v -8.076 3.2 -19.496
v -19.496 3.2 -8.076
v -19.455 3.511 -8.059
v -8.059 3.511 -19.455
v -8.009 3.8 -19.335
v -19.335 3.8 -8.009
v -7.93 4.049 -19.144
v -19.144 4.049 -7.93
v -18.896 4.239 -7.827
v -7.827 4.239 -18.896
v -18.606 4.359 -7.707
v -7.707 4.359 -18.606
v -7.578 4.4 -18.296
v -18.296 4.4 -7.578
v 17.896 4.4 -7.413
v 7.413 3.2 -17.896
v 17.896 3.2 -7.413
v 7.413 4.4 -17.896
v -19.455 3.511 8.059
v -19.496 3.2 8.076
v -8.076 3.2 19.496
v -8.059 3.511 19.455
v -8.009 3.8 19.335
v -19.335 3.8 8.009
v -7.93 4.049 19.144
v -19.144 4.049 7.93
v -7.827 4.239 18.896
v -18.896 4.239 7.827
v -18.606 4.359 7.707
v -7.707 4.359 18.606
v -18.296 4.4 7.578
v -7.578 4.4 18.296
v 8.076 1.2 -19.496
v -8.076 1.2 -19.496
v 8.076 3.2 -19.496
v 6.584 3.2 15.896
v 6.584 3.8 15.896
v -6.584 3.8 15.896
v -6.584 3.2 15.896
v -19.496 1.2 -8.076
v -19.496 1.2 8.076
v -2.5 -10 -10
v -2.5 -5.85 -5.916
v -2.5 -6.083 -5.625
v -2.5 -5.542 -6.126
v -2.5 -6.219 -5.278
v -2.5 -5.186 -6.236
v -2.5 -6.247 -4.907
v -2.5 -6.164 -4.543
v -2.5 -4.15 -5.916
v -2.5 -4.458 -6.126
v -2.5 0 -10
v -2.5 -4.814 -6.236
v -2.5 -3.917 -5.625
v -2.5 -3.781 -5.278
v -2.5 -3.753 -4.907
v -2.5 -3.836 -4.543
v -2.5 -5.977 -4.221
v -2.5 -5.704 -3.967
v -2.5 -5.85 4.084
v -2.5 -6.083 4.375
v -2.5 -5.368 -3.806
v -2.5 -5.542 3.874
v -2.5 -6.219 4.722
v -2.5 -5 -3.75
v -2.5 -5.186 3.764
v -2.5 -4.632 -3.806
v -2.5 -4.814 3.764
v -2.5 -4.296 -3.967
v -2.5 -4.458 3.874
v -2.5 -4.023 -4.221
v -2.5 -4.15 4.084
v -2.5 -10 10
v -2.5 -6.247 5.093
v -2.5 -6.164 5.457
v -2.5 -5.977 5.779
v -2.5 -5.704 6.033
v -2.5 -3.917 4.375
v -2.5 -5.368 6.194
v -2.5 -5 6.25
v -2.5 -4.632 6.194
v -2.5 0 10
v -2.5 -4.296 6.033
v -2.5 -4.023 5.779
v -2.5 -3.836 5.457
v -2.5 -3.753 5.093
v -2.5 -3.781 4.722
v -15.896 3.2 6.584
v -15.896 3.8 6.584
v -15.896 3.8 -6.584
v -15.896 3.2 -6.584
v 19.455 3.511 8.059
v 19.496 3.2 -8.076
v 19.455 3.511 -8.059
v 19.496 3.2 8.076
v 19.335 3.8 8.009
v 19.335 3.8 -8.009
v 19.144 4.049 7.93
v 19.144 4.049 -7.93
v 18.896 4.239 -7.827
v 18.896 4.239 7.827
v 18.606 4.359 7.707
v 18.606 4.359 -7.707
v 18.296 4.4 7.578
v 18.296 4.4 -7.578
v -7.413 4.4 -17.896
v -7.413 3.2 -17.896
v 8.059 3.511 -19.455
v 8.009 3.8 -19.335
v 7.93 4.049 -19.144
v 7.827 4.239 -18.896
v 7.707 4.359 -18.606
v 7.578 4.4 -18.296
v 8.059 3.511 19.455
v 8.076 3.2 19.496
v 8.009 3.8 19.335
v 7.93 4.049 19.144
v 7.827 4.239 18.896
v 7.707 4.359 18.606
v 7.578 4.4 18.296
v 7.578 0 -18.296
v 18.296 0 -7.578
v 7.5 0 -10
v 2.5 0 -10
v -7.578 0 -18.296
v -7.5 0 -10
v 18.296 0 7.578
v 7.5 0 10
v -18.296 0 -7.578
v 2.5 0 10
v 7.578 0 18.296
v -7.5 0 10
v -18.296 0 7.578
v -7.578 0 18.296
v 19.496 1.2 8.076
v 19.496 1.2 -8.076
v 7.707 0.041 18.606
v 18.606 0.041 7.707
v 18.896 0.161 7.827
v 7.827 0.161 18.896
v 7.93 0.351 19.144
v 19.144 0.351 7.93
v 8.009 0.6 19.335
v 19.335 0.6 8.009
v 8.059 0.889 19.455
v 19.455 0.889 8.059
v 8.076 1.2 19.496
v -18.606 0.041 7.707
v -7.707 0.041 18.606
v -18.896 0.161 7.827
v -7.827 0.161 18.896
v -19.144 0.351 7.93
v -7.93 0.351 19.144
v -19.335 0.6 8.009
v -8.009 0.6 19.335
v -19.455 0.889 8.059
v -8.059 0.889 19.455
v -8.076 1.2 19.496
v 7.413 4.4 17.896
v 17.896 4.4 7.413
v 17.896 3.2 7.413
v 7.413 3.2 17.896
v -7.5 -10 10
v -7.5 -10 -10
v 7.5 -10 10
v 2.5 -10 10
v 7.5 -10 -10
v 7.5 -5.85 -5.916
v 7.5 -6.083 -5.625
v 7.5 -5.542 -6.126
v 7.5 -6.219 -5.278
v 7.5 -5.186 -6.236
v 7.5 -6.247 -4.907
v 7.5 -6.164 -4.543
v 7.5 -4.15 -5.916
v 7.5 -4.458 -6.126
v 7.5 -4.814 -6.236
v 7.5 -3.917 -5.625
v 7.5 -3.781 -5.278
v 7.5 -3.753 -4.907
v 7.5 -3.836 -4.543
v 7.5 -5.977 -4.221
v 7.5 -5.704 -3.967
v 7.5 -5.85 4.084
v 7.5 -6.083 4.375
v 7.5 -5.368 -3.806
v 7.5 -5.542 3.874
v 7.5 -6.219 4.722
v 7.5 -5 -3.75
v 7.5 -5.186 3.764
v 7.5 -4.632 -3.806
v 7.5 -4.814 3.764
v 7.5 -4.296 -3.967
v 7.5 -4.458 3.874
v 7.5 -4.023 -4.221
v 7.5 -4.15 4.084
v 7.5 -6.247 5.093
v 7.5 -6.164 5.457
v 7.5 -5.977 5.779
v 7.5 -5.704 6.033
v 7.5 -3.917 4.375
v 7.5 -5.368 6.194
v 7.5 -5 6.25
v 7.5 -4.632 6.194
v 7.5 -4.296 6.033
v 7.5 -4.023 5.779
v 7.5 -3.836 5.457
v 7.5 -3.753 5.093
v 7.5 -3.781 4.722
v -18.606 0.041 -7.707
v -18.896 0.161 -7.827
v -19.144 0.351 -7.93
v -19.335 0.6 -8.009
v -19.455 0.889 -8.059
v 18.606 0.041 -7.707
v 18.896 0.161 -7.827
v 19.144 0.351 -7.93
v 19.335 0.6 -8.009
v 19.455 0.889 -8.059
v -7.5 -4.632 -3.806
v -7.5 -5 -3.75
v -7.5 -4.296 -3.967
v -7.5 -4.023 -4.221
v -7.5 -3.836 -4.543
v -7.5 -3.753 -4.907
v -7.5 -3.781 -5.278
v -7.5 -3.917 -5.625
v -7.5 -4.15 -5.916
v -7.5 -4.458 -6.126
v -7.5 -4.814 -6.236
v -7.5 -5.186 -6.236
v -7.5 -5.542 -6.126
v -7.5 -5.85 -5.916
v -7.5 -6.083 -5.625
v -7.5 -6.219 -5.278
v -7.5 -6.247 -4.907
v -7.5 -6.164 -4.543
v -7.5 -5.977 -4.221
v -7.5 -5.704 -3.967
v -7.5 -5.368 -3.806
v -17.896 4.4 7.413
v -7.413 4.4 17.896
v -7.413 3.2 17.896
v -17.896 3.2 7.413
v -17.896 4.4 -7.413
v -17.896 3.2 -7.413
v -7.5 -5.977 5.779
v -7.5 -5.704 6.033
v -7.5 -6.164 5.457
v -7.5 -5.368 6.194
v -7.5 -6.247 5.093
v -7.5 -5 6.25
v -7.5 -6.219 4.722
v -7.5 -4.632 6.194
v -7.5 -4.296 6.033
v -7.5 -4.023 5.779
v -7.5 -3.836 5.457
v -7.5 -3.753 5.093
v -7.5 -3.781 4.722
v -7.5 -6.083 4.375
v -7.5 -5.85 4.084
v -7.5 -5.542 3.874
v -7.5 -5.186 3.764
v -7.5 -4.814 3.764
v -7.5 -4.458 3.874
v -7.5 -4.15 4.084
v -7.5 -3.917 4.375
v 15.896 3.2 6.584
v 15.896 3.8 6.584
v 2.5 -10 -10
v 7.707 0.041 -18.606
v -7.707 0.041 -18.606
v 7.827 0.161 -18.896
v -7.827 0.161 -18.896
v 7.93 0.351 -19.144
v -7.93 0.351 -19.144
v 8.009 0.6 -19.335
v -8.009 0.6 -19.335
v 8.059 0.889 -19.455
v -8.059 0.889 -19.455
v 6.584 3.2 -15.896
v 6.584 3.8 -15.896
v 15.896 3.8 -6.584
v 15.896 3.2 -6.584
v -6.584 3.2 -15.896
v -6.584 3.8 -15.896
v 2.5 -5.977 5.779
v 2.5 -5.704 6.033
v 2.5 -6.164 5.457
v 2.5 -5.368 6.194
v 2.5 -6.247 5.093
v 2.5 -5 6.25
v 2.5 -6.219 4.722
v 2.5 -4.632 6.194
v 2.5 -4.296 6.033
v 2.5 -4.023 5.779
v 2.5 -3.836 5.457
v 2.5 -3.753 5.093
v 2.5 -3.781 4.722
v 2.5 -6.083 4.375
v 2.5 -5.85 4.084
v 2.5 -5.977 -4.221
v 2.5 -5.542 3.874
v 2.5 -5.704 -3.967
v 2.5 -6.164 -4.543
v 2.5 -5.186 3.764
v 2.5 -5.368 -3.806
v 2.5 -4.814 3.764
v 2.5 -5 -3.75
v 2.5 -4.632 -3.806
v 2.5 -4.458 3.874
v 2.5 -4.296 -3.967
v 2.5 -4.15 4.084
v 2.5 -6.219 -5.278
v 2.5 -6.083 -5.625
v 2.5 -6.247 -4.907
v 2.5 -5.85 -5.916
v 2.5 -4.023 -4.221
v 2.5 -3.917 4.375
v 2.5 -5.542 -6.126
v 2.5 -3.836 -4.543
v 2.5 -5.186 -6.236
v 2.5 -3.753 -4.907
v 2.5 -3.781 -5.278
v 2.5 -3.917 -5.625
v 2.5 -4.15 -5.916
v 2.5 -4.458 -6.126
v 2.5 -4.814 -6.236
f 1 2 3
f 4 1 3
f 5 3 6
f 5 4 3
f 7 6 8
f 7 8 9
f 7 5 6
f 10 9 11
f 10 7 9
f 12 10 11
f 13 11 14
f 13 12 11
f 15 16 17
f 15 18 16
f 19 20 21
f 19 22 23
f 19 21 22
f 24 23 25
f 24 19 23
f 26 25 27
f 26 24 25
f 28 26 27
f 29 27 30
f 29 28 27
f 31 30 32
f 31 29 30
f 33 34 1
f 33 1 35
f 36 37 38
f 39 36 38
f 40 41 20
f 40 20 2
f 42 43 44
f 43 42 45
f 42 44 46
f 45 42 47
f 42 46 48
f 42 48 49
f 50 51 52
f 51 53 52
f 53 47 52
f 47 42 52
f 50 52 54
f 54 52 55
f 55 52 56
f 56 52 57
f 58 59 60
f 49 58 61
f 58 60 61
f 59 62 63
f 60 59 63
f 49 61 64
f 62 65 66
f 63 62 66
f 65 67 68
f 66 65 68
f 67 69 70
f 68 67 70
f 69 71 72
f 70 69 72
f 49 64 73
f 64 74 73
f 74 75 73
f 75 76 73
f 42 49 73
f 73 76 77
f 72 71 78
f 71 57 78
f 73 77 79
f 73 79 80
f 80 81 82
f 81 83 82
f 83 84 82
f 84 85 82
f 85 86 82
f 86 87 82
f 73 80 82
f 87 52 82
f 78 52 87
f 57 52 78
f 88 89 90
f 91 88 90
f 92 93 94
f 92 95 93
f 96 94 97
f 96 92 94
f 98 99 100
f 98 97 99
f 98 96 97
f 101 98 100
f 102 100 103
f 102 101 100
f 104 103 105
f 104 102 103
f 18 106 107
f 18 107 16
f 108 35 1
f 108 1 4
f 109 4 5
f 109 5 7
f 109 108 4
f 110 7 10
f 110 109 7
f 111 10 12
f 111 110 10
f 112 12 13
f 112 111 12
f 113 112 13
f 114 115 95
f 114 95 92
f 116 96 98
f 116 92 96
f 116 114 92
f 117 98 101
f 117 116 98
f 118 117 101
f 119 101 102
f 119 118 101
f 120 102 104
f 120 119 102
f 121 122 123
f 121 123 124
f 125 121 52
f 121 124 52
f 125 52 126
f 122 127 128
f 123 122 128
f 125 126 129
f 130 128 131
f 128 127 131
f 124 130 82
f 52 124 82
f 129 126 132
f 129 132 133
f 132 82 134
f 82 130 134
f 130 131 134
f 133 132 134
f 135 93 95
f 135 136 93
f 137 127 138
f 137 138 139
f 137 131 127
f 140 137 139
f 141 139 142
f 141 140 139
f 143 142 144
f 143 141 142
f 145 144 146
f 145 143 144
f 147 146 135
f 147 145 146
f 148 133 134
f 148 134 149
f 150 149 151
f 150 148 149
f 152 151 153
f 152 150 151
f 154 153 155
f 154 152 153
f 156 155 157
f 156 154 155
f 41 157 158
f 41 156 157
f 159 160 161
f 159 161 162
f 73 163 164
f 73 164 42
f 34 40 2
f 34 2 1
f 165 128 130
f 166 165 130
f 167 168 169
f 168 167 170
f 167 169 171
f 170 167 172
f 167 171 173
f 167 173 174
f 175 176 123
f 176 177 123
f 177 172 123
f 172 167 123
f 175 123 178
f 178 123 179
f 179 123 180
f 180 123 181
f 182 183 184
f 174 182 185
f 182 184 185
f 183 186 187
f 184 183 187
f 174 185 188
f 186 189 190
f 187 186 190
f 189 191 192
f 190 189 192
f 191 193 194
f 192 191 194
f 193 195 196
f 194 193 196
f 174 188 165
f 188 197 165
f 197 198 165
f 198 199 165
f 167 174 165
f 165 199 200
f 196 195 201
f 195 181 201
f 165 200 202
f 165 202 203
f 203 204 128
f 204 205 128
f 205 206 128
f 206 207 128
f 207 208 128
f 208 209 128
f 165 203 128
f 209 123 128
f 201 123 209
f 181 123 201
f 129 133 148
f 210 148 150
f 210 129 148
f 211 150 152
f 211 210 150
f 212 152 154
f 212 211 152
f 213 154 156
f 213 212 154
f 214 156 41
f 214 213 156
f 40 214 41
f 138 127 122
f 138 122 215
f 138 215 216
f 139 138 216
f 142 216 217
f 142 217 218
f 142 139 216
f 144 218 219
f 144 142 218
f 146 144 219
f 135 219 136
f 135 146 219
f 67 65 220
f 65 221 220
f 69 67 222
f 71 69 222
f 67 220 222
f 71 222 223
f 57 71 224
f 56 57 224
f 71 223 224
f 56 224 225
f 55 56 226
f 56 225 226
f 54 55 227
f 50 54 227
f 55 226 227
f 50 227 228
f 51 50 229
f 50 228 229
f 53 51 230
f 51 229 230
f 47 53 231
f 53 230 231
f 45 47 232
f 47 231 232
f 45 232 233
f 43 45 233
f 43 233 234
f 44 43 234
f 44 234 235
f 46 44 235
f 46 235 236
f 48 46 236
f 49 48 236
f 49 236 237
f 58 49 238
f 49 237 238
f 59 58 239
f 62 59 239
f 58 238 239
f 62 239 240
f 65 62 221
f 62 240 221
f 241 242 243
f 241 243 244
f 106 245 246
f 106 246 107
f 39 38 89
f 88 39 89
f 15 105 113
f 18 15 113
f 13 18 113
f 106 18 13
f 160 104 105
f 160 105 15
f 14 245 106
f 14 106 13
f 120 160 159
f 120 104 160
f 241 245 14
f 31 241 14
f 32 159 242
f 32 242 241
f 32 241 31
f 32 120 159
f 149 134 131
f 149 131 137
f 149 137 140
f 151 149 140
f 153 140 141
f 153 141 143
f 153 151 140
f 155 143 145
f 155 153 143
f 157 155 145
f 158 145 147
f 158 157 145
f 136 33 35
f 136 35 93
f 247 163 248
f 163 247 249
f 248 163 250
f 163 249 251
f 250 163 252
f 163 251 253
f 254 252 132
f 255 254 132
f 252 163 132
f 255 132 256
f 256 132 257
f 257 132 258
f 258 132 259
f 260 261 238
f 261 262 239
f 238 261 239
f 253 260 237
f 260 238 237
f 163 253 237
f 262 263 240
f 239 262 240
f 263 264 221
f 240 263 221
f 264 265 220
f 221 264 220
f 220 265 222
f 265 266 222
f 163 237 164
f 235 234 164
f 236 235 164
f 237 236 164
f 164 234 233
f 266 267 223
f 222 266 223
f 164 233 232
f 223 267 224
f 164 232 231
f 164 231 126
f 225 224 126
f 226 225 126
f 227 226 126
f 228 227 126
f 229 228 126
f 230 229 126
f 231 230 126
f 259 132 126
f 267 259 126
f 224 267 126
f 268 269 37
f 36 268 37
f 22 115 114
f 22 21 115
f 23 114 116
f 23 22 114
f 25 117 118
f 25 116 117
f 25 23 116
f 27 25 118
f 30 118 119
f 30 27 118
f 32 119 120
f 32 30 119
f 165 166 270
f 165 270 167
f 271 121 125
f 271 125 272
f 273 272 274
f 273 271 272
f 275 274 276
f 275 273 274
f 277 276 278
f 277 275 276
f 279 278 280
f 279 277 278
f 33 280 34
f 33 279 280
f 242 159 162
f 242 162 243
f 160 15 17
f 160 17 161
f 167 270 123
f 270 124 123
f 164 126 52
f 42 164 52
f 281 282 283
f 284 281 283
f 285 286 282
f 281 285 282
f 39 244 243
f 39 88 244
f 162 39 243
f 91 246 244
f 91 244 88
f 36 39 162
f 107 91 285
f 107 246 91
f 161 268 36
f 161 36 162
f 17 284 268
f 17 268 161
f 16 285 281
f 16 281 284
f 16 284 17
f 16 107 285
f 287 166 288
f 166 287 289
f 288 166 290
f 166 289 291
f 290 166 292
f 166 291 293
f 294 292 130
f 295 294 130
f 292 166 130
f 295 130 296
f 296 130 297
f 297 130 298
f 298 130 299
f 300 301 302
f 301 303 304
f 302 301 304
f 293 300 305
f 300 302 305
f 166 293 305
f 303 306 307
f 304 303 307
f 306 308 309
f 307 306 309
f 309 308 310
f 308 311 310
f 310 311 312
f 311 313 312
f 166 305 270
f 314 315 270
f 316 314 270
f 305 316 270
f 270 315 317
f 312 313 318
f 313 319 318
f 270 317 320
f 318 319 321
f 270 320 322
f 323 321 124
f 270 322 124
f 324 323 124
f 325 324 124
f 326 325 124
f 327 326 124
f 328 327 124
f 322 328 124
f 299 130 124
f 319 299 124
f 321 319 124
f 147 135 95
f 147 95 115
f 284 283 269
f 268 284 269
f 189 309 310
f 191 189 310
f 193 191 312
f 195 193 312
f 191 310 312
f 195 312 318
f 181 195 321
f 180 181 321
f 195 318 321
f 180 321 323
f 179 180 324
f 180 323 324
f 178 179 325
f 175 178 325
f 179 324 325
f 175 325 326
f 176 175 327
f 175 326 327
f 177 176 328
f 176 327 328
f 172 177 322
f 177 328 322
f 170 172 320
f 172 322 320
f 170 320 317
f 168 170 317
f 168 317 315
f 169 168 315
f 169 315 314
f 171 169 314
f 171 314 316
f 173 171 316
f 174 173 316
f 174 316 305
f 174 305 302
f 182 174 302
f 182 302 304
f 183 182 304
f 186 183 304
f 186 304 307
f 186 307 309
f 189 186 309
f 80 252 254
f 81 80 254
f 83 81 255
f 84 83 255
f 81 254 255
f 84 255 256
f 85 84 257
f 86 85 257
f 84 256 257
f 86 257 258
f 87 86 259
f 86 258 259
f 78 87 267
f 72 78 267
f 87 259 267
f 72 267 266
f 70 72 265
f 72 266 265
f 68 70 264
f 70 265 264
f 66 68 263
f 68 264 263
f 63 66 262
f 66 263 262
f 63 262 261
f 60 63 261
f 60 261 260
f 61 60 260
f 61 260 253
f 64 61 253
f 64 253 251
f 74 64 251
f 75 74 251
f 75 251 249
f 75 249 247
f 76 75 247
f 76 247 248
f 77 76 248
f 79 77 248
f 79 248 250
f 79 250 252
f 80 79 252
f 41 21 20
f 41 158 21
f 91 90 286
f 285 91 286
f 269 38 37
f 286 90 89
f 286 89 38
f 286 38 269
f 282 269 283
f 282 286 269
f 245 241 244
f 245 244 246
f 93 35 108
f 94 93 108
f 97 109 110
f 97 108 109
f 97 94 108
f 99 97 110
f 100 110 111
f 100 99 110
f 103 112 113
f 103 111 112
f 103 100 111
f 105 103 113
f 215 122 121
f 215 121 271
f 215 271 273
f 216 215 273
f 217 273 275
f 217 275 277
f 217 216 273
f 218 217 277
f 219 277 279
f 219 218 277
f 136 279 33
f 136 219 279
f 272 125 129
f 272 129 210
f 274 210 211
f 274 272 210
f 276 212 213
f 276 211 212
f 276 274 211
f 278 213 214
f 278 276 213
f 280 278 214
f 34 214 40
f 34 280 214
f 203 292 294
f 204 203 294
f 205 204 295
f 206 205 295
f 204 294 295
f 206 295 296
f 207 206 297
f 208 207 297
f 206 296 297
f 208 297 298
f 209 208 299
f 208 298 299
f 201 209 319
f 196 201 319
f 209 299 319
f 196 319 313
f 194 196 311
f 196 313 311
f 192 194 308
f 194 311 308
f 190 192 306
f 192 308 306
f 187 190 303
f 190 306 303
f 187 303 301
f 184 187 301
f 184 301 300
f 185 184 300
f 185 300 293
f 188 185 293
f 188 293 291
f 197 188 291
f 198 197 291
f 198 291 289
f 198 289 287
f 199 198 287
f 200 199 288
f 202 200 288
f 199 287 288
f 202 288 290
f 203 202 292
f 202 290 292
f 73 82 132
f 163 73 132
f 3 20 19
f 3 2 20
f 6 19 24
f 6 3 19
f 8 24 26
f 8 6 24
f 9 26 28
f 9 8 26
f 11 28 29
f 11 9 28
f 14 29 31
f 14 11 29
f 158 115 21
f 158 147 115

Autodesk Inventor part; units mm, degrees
ref_plane "YZ Plane" through (0, 0, 0) normal (1, 0, 0) x (0, 1, 0)
ref_plane "XZ Plane" through (0, 0, 0) normal (0, 1, 0) x (-1, 0, 0)
ref_plane "XY Plane" through (0, 0, 0) normal (0, 0, 1) x (1, 0, 0)
sketch "스케치3" plane through (0, 0, 0) normal (0, 1, 0) x (-1, 0, 0)
  line L0 (19.4959, -8.0755) -> (8.0755, -19.4959)
  line L1 (8.0755, -19.4959) -> (-8.0755, -19.4959)
  line L2 (-8.0755, -19.4959) -> (-19.4959, -8.0755)
  line L3 (-19.4959, -8.0755) -> (-19.4959, 8.0755)
  line L4 (-19.4959, 8.0755) -> (-8.0755, 19.4959)
  line L5 (-8.0755, 19.4959) -> (8.0755, 19.4959)
  line L6 (8.0755, 19.4959) -> (19.4959, 8.0755)
  line L7 (19.4959, 8.0755) -> (19.4959, -8.0755)
  line L8 (6.75, -16.2959) -> (-6.75, -16.2959)
  line L9 (-6.75, -16.2959) -> (-16.2959, -6.75)
  line L10 (-16.2959, -6.75) -> (-16.2959, 6.75)
  line L11 (-16.2959, 6.75) -> (-6.75, 16.2959)
  line L12 (-6.75, 16.2959) -> (6.75, 16.2959)
  line L13 (6.75, 16.2959) -> (16.2959, 6.75)
  line L14 (16.2959, 6.75) -> (16.2959, -6.75)
  line L15 (16.2959, -6.75) -> (6.75, -16.2959)
  point P0 (0, 0)
  point P1 (0, 0)
  point P2 (0, 0)
  point P3 (0, 0)
  dimension "d66" = 13.5
  dimension "d67" = 3.2
extrude "돌출2" add sketch "스케치3" along normal blind 4.4 contours L0 L1 L2 L3 L4 L5 L6 L7 | L8 L9 L10 L11 L12 L13 L14 L15
sketch "스케치9" plane through (0, 0, 0) normal (0, -1, 0) x (1, 0, 0)
  line L0 (7.5, 10) -> (2.5, 10)
  line L1 (2.5, 10) -> (2.5, -10)
  line L2 (2.5, -10) -> (7.5, -10)
  line L3 (7.5, -10) -> (7.5, 10)
  line L4 (7.5, 10) -> (2.5, -10) construction
  line L5 (2.5, 10) -> (7.5, -10) construction
  line L6 (-2.5, 10) -> (-7.5, 10)
  line L7 (-7.5, 10) -> (-7.5, -10)
  line L8 (-7.5, -10) -> (-2.5, -10)
  line L9 (-2.5, 10) -> (-7.5, -10) construction
  line L10 (-7.5, 10) -> (-2.5, -10) construction
  line L11 (-2.5, -10) -> (-2.5, 10)
  point P0 (0, 0)
  point P1 (5, 0)
  point P2 (-5, 0)
  dimension "d42" = 20
  dimension "d43" = 5
  dimension "d44" = 2.5
  dimension "d47" = 10
extrude "돌출8" add sketch "스케치9" along normal blind 10
sketch "스케치10" plane through (-7.5, 0, -10) normal (-1, 0, 0) x (0, 0, 1)
  circle A0 centre (15, -5) radius 1.25
  line L0 (19.9591, 0) -> (0.0886, 0)
  line L1 (18.0755, 0) -> (1.9245, 0) projected
  circle A1 centre (5, -5) radius 1.25
  line L2 (20, 0) -> (20, -10) projected
  point P0 (10, 0)
  dimension "d54" = 2.5
  dimension "d57" = 10
  dimension "d62" = 5
  dimension "d63" = 5
extrude "돌출9" cut sketch "스케치10" against normal blind 20
fillet "모깎기1" radius 1.2 16 edges at (-13.7857, 4.4, 13.7857) (0, 4.4, 19.4959) (13.7857, 4.4, 13.7857) (19.4959, 4.4, 0) (13.7857, 4.4, -13.7857) (0, 4.4, -19.4959) (-13.7857, 4.4, -13.7857) (-19.4959, 4.4, 0) (-13.7857, 0, 13.7857) (0, 0, 19.4959) (13.7857, 0, 13.7857) (19.4959, 0, 0) (13.7857, 0, -13.7857) (0, 0, -19.4959) (-13.7857, 0, -13.7857) (-19.4959, 0, 0)
sketch "스케치12" plane through (0, 4.4, 0) normal (0, 1, 0) x (1, 0, 0)
  line L0 (7.4127, -17.8959) -> (-7.4127, -17.8959)
  line L1 (-7.4127, -17.8959) -> (-17.8959, -7.4127)
  line L2 (-17.8959, -7.4127) -> (-17.8959, 7.4127)
  line L3 (-17.8959, 7.4127) -> (-7.4127, 17.8959)
  line L4 (-7.4127, 17.8959) -> (7.4127, 17.8959)
  line L5 (7.4127, 17.8959) -> (17.8959, 7.4127)
  line L6 (17.8959, 7.4127) -> (17.8959, -7.4127)
  line L7 (17.8959, -7.4127) -> (7.4127, -17.8959)
  line L8 (-6.5843, 15.8959) -> (6.5843, 15.8959)
  line L9 (6.5843, 15.8959) -> (15.8959, 6.5843)
  line L10 (15.8959, 6.5843) -> (15.8959, -6.5843)
  line L11 (15.8959, -6.5843) -> (6.5843, -15.8959)
  line L12 (6.5843, -15.8959) -> (-6.5843, -15.8959)
  line L13 (-6.5843, -15.8959) -> (-15.8959, -6.5843)
  line L14 (-15.8959, -6.5843) -> (-15.8959, 6.5843)
  line L15 (-15.8959, 6.5843) -> (-6.5843, 15.8959)
  line L16 (-18.2959, -7.5784) -> (-18.2959, 7.5784) projected
  line L17 (-19.4959, 8.0755) -> (-19.4959, -8.0755) projected
  point P0 (0, 0)
  point P1 (0, 0)
  point P2 (0, 0)
  point P3 (-17.8959, 0)
  point P4 (-19.4959, 0)
  point P5 (-15.8959, 0)
  dimension "d100" = 1.6
  dimension "d101" = 2
extrude "돌출11" cut sketch "스케치12" against normal blind 1.2
sketch "스케치13" plane through (0, 4.4, 0) normal (0, 1, 0) x (1, 0, 0)
  line L0 (15.8959, 6.5843) -> (6.5843, 15.8959) projected
  line L1 (6.5843, 15.8959) -> (-6.5843, 15.8959) projected
  line L2 (-6.5843, 15.8959) -> (-15.8959, 6.5843) projected
  line L3 (-15.8959, 6.5843) -> (-15.8959, -6.5843) projected
  line L4 (-15.8959, -6.5843) -> (-6.5843, -15.8959) projected
  line L5 (-6.5843, -15.8959) -> (6.5843, -15.8959) projected
  line L6 (6.5843, -15.8959) -> (15.8959, -6.5843) projected
  line L7 (15.8959, -6.5843) -> (15.8959, 6.5843) projected
  point P0 (0, 0)
extrude "돌출12" cut sketch "스케치13" against normal blind 0.6
properties part number "OV-PAM_bottom_2"
